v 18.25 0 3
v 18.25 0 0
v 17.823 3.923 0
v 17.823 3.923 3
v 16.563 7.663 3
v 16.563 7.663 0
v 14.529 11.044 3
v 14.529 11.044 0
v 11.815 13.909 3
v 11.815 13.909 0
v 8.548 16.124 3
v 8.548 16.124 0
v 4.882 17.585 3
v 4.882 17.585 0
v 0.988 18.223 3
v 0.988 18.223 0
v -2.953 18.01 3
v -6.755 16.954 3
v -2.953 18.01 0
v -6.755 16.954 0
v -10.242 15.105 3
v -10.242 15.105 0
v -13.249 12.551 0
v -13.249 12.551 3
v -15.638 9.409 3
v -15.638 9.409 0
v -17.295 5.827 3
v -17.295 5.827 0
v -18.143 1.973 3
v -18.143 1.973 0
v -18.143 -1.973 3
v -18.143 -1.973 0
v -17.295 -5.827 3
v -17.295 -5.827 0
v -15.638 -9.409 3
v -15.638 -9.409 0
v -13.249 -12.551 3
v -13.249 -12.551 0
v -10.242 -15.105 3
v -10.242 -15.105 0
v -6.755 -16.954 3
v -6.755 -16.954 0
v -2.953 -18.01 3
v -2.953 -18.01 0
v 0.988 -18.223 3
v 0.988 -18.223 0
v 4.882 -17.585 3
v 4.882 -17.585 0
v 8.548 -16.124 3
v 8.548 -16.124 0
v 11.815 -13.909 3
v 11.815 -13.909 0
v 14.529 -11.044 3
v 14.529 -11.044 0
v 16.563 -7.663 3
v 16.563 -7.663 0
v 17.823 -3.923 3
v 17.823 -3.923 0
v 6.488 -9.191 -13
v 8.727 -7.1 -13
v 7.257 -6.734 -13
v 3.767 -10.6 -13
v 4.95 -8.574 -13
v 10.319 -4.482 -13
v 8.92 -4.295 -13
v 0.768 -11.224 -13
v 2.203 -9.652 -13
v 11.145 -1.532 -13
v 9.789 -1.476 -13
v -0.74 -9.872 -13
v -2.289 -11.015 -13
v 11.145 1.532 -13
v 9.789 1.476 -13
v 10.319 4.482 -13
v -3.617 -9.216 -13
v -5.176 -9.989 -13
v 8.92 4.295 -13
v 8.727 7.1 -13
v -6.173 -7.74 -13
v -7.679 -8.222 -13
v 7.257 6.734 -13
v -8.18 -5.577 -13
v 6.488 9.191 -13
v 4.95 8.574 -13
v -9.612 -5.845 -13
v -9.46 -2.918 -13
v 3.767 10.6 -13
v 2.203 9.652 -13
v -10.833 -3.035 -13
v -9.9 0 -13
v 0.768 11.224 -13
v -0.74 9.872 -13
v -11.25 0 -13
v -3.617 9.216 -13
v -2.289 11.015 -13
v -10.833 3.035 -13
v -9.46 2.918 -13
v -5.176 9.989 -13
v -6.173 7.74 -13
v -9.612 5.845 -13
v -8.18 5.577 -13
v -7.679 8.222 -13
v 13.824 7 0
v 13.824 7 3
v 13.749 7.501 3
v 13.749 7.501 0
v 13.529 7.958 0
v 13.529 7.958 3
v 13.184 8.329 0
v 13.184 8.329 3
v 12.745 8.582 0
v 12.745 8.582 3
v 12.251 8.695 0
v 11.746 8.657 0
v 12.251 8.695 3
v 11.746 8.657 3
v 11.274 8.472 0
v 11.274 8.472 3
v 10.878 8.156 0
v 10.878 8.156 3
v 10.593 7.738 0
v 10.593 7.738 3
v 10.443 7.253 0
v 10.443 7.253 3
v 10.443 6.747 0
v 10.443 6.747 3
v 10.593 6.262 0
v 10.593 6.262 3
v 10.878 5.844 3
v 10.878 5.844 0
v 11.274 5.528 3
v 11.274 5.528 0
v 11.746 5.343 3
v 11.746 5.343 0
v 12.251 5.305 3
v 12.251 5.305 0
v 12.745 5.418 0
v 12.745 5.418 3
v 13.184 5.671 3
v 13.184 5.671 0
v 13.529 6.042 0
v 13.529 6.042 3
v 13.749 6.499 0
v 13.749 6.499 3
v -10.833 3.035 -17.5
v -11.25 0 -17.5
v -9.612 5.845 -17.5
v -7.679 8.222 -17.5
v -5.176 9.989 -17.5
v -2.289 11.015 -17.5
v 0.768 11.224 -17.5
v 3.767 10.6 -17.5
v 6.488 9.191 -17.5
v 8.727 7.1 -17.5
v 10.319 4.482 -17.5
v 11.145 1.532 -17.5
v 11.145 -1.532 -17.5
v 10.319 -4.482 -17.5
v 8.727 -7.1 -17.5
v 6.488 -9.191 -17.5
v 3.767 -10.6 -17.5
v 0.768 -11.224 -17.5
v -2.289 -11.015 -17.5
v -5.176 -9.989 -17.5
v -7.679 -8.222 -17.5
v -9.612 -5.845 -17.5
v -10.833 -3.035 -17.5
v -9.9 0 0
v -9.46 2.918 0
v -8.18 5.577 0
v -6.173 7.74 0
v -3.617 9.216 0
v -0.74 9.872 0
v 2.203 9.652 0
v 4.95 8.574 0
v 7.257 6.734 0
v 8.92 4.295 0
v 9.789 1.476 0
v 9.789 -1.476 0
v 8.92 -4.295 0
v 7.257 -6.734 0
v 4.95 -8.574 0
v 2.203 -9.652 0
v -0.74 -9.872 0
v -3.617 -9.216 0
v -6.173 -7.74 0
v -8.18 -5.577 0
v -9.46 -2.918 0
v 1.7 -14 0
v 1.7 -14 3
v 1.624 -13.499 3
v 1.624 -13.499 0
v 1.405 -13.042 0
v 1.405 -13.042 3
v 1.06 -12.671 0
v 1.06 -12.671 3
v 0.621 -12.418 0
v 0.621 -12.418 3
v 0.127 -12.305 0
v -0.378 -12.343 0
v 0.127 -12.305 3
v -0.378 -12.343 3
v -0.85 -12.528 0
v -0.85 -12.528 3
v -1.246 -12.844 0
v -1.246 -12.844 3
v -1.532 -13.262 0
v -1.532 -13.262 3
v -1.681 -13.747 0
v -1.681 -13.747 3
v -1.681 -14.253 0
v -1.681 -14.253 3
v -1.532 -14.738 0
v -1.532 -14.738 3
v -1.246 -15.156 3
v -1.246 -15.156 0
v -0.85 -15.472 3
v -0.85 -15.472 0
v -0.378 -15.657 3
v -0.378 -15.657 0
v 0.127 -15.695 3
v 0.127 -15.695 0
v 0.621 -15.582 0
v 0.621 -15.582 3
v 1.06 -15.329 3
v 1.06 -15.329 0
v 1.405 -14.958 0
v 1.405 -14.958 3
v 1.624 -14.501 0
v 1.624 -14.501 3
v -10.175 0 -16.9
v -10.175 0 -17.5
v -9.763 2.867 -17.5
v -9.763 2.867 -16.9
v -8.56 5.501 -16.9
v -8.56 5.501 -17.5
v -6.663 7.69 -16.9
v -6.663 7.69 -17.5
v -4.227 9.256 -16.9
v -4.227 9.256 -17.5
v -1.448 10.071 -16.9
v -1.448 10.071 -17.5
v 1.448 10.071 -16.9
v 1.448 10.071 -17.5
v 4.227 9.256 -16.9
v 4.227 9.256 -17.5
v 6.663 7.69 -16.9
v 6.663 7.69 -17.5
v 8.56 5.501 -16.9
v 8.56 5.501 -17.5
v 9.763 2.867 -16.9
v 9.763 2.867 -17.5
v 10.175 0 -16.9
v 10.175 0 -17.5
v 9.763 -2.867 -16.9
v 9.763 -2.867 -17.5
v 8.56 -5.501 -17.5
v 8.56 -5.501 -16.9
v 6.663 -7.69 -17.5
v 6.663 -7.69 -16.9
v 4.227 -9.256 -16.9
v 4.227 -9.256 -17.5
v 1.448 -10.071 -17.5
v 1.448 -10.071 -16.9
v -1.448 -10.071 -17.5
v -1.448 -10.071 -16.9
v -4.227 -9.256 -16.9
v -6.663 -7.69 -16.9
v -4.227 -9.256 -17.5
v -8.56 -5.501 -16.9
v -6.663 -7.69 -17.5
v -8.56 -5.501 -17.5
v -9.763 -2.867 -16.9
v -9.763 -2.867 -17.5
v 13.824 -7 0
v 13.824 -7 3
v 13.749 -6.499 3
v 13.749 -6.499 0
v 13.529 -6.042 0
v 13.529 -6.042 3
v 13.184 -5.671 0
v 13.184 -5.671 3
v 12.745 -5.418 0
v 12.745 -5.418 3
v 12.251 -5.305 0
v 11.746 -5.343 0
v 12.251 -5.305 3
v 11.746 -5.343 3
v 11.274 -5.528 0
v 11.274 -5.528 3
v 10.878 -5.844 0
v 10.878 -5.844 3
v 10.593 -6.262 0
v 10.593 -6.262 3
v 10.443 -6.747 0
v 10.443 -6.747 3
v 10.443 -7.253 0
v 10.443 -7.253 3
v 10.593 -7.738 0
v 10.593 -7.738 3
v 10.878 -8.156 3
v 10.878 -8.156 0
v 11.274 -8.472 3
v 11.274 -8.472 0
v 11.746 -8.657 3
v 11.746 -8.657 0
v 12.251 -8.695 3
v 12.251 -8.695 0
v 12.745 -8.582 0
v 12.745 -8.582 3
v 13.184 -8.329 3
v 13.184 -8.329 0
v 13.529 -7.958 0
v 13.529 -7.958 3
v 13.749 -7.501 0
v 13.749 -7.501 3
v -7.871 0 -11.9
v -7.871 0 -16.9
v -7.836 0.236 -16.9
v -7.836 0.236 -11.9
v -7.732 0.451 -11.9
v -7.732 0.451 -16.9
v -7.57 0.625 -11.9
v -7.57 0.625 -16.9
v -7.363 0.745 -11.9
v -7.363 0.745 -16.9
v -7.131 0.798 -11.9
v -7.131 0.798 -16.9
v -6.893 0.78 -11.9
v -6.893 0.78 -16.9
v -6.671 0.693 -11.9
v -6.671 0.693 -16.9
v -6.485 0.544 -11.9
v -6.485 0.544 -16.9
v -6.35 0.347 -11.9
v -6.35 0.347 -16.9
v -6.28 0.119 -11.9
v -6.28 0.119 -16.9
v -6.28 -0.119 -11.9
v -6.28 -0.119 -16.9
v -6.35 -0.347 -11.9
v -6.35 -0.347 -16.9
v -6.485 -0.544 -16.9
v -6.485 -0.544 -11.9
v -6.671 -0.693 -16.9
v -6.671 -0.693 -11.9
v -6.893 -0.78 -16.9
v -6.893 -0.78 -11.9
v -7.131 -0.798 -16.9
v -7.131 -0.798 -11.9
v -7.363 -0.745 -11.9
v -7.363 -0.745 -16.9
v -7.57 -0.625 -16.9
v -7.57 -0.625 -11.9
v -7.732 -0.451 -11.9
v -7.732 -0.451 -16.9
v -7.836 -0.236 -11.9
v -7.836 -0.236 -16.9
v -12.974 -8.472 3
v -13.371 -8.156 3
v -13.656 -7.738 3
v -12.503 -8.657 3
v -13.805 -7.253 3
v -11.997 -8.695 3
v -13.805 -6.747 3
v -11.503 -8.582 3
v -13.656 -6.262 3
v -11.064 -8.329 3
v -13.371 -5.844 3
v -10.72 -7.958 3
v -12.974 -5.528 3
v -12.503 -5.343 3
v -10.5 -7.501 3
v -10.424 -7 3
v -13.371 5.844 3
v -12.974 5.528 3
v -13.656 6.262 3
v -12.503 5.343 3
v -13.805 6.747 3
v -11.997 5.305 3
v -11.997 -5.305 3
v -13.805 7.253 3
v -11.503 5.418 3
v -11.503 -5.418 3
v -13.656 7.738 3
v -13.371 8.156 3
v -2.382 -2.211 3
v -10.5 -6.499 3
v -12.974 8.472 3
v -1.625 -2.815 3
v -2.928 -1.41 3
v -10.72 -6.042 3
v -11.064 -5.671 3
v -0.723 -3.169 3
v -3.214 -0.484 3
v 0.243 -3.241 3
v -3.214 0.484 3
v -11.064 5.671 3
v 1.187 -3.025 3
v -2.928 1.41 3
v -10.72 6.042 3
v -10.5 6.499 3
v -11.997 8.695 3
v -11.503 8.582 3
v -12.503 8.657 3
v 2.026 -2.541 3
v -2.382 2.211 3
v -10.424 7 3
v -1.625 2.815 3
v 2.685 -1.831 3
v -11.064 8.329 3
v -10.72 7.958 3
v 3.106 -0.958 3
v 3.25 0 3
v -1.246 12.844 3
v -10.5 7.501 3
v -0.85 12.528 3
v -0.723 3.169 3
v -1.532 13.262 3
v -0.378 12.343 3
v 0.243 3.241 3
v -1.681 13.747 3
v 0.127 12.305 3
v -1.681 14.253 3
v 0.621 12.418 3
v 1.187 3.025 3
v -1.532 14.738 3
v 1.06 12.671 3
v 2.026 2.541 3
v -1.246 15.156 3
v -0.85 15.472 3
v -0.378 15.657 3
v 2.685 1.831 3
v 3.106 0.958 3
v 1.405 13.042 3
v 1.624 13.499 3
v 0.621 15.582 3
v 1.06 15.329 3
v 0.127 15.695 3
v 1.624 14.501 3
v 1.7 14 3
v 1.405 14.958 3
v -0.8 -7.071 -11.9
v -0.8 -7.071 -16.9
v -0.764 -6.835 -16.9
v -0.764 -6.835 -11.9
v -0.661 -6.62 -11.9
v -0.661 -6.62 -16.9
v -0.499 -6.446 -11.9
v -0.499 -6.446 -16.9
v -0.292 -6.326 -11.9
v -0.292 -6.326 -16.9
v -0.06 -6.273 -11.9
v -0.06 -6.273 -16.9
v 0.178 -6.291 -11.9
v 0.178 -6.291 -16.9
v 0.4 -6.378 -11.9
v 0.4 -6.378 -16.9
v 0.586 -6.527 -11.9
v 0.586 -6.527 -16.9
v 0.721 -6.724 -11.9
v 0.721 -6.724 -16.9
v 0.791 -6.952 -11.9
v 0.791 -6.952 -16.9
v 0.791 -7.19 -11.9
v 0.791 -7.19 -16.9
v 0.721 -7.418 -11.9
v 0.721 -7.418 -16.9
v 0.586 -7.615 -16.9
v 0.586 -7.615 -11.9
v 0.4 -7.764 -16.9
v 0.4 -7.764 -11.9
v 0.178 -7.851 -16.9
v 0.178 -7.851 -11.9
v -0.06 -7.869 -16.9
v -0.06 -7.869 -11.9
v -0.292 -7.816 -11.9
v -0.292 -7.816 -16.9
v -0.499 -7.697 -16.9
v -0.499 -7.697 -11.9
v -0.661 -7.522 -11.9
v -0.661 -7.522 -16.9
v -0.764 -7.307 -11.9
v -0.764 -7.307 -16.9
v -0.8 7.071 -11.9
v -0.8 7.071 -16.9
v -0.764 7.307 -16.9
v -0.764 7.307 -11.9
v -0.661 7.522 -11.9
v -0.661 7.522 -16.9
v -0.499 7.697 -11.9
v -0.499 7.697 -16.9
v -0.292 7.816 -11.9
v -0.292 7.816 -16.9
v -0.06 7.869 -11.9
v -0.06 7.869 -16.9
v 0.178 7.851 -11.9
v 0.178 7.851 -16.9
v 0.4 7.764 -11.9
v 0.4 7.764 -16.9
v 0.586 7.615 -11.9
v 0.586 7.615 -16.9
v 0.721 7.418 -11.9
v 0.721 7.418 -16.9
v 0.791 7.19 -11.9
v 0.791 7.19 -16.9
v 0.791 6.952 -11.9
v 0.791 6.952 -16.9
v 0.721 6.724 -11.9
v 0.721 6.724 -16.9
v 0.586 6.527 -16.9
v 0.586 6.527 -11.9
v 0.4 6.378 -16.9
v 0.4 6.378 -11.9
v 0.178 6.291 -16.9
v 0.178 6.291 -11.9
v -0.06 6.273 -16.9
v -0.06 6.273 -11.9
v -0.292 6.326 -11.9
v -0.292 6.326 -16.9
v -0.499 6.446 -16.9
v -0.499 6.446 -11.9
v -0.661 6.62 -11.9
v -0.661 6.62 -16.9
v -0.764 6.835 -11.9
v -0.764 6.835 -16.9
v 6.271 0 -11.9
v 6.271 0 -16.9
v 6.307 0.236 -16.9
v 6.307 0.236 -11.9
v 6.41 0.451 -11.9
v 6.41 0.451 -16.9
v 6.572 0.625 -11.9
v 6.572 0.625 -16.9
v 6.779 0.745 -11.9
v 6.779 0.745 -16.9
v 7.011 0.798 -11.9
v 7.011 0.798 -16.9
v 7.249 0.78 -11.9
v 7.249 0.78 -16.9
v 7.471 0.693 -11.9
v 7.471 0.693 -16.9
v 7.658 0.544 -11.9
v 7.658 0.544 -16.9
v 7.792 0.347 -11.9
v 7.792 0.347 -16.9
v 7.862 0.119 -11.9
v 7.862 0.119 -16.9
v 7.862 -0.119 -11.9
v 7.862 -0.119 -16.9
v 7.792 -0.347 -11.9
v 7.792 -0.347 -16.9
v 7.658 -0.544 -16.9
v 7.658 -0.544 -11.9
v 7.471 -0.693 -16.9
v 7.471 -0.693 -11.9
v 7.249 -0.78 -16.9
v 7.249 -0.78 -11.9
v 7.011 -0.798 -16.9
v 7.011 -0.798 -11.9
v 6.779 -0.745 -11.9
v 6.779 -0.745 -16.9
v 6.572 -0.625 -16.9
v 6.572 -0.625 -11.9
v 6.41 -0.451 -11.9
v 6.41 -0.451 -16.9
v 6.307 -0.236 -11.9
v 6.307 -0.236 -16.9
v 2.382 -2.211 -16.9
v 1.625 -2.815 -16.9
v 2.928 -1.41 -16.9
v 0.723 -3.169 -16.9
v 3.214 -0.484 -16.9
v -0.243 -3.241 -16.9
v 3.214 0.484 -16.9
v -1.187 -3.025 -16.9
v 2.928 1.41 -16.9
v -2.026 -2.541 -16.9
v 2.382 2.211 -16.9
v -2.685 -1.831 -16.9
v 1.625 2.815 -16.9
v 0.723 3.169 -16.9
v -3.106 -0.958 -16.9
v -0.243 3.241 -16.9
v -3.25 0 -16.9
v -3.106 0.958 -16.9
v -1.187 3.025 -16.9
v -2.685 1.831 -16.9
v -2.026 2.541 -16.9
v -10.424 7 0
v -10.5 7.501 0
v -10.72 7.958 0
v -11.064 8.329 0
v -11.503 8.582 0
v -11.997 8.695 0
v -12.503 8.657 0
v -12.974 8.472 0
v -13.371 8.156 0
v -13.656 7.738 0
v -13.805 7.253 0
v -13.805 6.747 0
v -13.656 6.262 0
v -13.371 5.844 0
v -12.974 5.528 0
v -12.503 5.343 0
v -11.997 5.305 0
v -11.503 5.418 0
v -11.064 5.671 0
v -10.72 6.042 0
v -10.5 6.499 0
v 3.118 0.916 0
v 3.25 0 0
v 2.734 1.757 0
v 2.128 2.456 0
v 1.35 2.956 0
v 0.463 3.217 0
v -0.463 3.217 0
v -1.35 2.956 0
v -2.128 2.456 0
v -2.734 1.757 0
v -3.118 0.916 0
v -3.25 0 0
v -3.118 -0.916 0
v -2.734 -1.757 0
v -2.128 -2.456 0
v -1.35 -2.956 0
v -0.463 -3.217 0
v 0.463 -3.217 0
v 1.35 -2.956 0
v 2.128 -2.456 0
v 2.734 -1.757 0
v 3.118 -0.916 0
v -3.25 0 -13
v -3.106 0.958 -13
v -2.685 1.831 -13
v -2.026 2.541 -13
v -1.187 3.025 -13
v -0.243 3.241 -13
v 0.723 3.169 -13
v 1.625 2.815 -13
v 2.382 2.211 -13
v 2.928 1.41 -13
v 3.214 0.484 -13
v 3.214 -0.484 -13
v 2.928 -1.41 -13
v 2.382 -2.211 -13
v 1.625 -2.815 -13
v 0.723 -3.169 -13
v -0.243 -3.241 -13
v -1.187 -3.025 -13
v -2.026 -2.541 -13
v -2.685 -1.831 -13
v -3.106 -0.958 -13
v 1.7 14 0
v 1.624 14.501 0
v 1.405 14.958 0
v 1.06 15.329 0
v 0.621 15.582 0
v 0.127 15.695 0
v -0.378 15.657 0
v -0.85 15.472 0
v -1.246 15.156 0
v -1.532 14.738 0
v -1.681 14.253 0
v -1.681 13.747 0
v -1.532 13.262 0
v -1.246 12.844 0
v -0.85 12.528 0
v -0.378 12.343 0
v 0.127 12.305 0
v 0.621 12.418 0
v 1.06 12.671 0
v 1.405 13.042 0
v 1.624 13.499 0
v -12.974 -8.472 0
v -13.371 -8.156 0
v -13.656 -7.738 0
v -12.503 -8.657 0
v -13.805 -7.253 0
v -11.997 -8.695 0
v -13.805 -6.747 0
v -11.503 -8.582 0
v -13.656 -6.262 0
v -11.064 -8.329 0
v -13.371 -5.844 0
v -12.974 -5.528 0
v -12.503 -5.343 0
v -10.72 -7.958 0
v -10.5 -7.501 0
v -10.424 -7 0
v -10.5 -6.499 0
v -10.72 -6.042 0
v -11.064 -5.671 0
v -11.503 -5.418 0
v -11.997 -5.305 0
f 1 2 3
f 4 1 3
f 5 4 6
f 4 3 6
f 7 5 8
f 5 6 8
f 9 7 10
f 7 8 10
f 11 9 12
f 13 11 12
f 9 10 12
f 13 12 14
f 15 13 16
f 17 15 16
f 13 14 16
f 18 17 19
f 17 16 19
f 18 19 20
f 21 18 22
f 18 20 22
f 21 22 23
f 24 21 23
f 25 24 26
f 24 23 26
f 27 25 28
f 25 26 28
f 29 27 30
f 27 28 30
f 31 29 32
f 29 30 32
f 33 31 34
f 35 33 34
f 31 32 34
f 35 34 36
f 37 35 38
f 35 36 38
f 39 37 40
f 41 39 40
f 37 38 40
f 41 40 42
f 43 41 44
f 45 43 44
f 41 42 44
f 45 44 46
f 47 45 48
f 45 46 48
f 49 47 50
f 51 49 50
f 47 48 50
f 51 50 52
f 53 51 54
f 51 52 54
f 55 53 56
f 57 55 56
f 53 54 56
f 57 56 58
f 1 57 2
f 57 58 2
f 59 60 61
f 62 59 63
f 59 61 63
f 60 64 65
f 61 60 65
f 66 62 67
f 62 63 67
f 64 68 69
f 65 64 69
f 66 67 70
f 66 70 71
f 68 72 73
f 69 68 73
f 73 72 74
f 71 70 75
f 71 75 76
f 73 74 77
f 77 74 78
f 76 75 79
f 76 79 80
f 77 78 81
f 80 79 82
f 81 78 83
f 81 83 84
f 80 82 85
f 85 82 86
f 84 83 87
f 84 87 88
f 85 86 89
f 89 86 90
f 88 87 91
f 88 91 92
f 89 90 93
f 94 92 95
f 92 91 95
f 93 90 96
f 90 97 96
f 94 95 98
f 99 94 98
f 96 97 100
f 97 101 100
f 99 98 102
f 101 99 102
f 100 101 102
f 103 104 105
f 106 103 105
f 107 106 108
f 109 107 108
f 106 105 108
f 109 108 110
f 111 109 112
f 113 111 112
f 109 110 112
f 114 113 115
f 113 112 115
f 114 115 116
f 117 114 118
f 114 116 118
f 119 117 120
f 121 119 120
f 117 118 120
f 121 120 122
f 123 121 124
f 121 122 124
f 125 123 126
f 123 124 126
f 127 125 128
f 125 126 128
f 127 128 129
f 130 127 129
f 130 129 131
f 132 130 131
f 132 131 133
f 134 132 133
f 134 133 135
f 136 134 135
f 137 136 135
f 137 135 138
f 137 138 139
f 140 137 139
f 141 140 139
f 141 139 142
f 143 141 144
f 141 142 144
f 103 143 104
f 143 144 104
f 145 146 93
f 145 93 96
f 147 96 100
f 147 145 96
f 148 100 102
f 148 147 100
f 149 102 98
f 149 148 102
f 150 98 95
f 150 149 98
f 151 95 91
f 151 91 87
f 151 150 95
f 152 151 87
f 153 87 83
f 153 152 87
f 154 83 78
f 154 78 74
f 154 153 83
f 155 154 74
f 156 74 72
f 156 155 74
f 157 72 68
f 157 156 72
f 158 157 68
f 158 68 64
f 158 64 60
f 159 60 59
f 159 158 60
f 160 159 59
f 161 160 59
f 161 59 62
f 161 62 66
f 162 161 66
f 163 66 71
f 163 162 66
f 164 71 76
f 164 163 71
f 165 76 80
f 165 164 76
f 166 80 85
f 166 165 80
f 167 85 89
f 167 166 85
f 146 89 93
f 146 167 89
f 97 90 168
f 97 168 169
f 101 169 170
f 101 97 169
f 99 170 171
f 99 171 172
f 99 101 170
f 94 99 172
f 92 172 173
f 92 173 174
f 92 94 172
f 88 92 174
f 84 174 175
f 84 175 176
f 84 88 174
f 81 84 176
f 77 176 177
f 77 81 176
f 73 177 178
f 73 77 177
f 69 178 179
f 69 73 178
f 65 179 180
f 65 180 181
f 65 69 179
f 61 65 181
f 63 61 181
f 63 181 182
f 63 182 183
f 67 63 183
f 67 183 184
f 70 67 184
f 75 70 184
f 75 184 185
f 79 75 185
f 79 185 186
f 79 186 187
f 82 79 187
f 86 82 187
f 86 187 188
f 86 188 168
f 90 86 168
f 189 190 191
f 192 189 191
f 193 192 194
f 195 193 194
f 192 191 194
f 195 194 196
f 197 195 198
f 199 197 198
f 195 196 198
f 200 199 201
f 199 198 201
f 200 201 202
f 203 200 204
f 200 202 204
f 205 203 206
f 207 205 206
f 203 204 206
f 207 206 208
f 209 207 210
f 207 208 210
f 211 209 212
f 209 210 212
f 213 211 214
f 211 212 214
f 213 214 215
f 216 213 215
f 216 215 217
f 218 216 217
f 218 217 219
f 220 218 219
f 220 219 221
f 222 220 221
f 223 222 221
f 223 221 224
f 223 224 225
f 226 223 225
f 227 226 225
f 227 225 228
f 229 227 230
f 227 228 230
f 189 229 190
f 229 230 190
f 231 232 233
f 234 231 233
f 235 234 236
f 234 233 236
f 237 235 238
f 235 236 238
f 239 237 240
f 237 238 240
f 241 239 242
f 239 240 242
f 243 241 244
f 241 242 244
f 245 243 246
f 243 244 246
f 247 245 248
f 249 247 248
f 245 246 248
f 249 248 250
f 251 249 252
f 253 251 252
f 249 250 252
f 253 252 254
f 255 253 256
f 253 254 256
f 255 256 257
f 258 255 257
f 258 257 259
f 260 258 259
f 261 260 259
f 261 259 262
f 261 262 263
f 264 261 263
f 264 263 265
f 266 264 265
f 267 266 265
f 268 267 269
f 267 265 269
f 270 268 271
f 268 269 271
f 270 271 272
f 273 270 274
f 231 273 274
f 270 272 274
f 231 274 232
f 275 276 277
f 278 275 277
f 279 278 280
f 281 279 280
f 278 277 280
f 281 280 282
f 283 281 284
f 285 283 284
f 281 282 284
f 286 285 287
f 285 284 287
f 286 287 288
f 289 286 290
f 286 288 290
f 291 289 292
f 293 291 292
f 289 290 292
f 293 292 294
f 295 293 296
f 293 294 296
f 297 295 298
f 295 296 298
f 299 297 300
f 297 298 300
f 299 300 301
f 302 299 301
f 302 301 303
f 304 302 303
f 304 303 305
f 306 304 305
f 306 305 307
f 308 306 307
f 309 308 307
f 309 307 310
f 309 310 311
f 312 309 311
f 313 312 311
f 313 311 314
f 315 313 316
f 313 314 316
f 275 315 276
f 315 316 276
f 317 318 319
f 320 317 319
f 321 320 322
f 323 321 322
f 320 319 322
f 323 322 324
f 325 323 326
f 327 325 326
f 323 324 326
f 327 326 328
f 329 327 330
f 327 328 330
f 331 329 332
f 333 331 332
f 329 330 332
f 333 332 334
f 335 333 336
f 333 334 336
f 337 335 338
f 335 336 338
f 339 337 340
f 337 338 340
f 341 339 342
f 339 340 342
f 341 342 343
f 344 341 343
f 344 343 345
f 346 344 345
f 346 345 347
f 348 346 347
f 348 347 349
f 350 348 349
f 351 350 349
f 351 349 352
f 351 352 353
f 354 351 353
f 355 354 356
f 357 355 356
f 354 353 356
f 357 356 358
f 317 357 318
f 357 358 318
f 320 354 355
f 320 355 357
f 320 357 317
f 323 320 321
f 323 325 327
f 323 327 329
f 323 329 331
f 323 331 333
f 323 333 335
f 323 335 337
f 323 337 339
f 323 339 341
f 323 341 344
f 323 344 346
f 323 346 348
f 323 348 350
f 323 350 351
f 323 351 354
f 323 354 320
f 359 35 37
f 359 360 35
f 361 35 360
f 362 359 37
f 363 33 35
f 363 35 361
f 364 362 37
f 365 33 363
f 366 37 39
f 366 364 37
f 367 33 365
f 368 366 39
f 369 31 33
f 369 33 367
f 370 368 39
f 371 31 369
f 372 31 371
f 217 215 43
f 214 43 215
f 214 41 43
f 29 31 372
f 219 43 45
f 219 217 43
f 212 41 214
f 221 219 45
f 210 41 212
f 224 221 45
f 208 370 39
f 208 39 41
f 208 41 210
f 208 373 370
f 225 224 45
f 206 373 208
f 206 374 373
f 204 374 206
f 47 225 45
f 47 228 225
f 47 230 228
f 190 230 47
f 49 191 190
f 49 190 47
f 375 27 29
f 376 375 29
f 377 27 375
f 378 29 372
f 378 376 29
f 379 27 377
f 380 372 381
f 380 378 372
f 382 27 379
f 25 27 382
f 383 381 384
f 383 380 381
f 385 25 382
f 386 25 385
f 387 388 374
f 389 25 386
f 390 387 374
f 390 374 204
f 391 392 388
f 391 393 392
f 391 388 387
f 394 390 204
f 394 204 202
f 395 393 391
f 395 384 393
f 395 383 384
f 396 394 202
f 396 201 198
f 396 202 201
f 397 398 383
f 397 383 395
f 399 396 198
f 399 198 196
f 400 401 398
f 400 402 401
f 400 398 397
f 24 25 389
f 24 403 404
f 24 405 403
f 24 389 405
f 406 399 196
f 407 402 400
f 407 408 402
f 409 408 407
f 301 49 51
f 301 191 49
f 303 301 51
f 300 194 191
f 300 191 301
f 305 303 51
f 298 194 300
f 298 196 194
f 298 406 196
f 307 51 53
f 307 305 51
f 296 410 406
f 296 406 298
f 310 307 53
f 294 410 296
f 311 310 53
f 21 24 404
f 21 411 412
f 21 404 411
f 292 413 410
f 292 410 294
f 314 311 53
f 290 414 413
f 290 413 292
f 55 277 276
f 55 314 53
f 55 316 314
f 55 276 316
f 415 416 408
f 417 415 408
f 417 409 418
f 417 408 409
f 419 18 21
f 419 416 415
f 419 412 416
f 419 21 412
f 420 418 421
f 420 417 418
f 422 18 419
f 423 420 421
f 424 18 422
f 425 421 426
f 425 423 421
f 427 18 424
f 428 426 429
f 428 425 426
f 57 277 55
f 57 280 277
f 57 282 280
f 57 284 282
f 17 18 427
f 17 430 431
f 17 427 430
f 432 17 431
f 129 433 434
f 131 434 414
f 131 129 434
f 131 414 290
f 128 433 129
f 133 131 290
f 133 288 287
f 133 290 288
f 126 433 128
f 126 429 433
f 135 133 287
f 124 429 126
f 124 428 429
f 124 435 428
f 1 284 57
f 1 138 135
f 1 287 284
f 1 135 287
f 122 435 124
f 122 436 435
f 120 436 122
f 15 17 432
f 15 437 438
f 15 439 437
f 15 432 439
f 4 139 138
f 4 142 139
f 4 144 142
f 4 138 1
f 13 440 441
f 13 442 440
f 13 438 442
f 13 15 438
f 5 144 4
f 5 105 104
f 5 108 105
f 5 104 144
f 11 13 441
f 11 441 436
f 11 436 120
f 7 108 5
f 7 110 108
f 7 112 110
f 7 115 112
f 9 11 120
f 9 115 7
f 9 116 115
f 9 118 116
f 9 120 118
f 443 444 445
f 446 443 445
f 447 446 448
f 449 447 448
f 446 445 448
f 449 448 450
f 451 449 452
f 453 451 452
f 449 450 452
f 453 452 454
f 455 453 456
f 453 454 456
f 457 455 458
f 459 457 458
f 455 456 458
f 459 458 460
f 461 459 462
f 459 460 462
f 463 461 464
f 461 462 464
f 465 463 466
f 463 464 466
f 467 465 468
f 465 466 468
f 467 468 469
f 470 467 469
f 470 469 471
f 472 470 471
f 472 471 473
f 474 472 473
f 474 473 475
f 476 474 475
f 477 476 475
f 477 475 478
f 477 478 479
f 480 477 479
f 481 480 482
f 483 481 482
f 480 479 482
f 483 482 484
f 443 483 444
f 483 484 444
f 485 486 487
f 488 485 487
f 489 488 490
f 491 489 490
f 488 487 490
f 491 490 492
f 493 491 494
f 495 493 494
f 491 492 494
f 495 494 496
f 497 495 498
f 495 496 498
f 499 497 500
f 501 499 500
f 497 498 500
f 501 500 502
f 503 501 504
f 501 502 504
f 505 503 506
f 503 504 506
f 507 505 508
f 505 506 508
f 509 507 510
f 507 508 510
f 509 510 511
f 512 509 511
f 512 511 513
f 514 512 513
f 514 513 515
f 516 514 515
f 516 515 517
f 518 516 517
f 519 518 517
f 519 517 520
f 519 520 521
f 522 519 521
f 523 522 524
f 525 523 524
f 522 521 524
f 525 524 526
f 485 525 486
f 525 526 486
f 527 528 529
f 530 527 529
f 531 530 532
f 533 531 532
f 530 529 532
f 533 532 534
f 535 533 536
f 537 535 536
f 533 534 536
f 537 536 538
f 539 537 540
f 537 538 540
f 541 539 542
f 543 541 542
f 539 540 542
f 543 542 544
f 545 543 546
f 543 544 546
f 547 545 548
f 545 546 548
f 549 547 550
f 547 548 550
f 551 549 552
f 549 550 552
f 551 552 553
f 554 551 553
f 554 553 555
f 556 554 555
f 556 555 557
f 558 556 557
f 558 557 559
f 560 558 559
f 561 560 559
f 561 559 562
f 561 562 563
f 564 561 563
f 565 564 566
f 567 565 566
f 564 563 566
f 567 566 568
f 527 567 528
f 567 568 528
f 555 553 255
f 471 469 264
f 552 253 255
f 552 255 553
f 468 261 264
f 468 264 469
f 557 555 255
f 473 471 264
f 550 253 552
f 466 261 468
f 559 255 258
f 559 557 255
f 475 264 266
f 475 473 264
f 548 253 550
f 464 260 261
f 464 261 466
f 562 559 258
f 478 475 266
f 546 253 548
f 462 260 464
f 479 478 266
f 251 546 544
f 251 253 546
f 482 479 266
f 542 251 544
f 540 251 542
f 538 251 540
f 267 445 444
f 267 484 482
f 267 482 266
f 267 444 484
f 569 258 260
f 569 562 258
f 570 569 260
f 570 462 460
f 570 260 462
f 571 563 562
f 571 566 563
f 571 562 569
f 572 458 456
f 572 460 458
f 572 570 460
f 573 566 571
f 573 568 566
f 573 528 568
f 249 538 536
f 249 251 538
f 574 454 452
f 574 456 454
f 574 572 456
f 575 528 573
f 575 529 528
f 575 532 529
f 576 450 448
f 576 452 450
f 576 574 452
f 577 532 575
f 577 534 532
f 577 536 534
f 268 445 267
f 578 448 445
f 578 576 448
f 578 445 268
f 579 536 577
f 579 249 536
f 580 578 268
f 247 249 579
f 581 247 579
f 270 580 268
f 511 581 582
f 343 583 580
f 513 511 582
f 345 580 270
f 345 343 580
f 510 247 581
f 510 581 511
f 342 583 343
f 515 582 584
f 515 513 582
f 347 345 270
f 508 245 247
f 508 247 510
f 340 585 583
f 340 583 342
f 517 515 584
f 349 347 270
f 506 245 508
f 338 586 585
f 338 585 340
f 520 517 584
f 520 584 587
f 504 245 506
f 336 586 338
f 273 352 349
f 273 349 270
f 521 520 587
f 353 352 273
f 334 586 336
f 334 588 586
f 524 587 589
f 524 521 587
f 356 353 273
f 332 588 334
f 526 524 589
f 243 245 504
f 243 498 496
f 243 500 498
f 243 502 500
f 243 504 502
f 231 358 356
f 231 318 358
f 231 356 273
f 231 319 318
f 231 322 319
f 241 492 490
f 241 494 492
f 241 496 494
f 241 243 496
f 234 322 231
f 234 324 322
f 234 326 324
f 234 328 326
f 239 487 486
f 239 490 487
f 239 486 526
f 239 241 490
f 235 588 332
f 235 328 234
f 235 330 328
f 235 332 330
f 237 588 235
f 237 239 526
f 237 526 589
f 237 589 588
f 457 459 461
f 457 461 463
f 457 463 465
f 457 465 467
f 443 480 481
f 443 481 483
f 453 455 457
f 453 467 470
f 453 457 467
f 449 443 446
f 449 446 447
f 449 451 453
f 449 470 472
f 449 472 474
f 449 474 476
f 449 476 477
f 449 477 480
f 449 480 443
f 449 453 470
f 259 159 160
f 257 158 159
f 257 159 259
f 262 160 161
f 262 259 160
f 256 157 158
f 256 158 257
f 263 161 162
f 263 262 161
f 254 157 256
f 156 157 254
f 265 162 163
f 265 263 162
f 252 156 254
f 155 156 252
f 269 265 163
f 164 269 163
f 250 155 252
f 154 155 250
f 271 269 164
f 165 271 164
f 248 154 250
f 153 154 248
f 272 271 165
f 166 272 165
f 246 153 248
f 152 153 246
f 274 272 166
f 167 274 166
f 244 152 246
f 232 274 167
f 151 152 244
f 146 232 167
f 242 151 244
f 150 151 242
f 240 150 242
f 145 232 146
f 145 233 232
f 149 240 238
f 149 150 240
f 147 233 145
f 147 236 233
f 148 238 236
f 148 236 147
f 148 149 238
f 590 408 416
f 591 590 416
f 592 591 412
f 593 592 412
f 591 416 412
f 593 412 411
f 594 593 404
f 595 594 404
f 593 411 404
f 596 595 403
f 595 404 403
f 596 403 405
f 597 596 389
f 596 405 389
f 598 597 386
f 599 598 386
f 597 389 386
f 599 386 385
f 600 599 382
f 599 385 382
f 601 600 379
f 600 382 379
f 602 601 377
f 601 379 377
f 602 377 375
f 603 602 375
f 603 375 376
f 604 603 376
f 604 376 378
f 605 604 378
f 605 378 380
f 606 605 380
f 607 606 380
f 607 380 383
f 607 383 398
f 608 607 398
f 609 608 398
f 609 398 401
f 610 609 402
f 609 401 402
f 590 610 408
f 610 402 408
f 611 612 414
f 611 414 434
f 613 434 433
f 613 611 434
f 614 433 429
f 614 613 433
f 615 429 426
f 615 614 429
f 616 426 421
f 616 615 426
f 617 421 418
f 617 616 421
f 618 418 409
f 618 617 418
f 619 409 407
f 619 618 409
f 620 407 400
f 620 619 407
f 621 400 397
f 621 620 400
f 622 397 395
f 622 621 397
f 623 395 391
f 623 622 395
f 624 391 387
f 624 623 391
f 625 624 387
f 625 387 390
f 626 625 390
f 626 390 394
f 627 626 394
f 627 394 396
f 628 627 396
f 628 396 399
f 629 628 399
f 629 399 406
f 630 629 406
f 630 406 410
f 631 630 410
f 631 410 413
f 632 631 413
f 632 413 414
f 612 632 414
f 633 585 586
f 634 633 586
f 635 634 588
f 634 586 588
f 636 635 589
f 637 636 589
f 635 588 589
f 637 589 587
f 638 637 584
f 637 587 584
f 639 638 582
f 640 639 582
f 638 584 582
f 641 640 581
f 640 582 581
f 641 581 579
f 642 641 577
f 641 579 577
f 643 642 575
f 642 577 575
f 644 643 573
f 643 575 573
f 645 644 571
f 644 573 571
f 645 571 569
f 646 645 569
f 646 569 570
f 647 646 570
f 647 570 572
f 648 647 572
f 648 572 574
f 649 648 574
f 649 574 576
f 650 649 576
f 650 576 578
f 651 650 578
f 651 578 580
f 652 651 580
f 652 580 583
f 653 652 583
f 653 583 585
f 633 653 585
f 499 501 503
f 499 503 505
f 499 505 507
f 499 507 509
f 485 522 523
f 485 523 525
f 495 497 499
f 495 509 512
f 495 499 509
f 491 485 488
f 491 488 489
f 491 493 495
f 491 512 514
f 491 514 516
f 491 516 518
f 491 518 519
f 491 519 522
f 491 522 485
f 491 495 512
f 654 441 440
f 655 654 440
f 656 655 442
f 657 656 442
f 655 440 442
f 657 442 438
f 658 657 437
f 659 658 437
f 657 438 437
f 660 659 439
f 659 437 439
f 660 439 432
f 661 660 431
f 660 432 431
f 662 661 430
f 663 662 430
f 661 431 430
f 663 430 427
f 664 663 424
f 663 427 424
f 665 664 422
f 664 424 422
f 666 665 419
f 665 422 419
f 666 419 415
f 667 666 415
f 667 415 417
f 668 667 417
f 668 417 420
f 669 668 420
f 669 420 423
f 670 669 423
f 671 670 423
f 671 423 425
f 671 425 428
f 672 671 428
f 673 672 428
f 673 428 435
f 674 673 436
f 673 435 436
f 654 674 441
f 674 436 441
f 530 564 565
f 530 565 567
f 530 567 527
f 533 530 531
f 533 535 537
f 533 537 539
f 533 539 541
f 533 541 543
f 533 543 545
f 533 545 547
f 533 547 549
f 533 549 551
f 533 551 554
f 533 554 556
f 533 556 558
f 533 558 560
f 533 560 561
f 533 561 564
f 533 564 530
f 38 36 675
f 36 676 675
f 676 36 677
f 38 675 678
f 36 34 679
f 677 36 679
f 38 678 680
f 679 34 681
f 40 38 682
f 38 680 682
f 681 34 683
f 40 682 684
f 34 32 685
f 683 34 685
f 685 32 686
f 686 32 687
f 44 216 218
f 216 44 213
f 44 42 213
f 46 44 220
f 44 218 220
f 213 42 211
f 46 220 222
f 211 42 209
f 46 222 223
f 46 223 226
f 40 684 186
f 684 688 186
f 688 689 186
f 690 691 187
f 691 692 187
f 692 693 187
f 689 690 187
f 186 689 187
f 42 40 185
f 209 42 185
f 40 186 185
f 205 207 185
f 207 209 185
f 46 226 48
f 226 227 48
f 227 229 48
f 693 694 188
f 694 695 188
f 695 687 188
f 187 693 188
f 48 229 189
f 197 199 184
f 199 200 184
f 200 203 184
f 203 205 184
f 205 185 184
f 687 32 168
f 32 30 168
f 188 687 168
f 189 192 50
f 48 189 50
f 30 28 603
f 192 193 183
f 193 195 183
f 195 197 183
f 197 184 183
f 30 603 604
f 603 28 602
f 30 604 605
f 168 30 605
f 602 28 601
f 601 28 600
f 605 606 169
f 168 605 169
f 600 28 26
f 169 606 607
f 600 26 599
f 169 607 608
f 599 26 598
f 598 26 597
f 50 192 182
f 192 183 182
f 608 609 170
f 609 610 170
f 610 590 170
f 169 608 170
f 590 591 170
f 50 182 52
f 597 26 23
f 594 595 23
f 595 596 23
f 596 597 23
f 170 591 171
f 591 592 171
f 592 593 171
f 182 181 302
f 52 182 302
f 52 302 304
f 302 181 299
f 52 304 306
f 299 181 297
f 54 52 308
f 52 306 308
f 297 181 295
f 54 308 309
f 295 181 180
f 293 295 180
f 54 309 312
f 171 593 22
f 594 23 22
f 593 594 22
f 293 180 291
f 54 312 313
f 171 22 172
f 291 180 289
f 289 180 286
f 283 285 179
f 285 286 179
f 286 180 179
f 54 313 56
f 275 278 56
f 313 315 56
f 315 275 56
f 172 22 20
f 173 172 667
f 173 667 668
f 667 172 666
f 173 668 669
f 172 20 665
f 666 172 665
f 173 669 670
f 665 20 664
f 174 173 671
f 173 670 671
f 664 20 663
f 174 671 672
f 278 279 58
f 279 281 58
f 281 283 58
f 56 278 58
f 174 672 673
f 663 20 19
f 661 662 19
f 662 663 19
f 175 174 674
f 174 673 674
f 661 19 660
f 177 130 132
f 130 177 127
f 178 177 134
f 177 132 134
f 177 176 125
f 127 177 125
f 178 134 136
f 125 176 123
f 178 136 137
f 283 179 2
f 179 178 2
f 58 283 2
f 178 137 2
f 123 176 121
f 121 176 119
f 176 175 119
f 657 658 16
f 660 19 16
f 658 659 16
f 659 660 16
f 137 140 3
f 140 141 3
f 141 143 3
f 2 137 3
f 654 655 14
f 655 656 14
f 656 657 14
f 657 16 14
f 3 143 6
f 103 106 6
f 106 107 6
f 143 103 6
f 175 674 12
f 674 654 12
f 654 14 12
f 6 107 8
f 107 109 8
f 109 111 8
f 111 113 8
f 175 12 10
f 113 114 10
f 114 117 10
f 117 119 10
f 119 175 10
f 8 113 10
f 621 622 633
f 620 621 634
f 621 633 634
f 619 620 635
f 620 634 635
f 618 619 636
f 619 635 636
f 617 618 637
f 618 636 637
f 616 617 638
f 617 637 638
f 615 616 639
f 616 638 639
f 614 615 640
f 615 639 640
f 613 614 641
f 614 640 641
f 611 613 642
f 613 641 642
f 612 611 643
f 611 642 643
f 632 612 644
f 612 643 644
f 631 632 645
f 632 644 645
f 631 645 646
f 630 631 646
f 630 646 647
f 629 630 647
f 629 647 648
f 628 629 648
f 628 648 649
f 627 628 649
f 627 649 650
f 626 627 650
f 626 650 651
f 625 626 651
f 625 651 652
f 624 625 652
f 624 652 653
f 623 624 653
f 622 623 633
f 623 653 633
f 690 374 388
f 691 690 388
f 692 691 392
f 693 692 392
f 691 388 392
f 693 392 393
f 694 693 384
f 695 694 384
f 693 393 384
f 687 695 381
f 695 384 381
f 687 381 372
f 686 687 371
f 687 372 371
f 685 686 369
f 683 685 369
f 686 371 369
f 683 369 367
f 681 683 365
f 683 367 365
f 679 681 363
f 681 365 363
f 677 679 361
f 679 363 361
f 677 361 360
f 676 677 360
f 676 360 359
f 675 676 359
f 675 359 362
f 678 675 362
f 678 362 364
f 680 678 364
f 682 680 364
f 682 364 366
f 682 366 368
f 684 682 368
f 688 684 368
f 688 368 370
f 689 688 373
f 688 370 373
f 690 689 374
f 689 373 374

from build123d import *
from build123d.topology import SkipClean

# Parameters (mm, degrees)
SKETCH_36_5_3_R             = 18.25
SKETCH_36_5_3_R_2           = 3.25
EXTRUDE_36_5_3_DEPTH        = 3
EXTRUDE_START               = 17.5
SKETCH_19_8_17_5_R          = 9.9
SKETCH_19_8_17_5_R_2        = 3.25
EXTRUDE_19_8_17_5_DEPTH     = 17.5
SKETCH_22_5_4_5_R           = 11.25
SKETCH_22_5_4_5_R_2         = 3.25
EXTRUDE_22_5_4_5_DEPTH      = 4.5
SKETCH_3_4_28_R             = 1.7
CUT_EXTRUDE_3_4_28_DEPTH    = 3
SKETCH_20_35_0_6_R          = 10.175
CUT_EXTRUDE_20_35_0_6_DEPTH = 0.6
M2X0_4_14_142_2_R           = 0.8
M2X0_4_14_142_DEPTH         = 5


with BuildPart() as part:
    # 轴承端法兰_Ø36.5_厚3_草图 → 轴承端法兰_Ø36.5_厚3 (new body)
    with BuildSketch(Plane.XY):
        Circle(SKETCH_36_5_3_R)
        Circle(SKETCH_36_5_3_R_2, mode=Mode.SUBTRACT)
    extrude(amount=EXTRUDE_36_5_3_DEPTH)

    # 穿轴颈_Ø19.8_长17.5_草图 → 穿轴颈_Ø19.8_长17.5 (add)
    with SkipClean():  # the faces are left unmerged after this step: merging them gives an invalid solid
        with BuildSketch(Plane(origin=(0, 0, 0), x_dir=(-1, 0, 0), z_dir=(0, 0, -1)).offset(EXTRUDE_START)):
            Circle(SKETCH_19_8_17_5_R)
            Circle(SKETCH_19_8_17_5_R_2, mode=Mode.SUBTRACT)
        extrude(amount=-EXTRUDE_19_8_17_5_DEPTH)

    # 舵盘端凸缘_Ø22.5_长4.5_草图 → 舵盘端凸缘_Ø22.5_长4.5 (add)
    with SkipClean():  # the faces are left unmerged after this step: merging them gives an invalid solid
        with BuildSketch(Plane(origin=(0, 0, -17.5), x_dir=(-1, 0, 0), z_dir=(0, 0, -1))):
            Circle(SKETCH_22_5_4_5_R)
            Circle(SKETCH_22_5_4_5_R_2, mode=Mode.SUBTRACT)
        extrude(amount=-EXTRUDE_22_5_4_5_DEPTH)

    # 轴承端_六处Ø3.4_分度圆Ø28_草图 → 轴承端_六处Ø3.4_分度圆Ø28 (cut)
    with SkipClean():  # the faces are left unmerged after this step: merging them gives an invalid solid
        with BuildSketch(Plane.XY.offset(3)):
            with Locations((12.124355653, 7)):
                Circle(SKETCH_3_4_28_R)
            with Locations((0, 14)):
                Circle(SKETCH_3_4_28_R)
            with Locations((-12.124355653, 7)):
                Circle(SKETCH_3_4_28_R)
            with Locations((-12.124355653, -7)):
                Circle(SKETCH_3_4_28_R)
            with Locations((0, -14)):
                Circle(SKETCH_3_4_28_R)
            with Locations((12.124355653, -7)):
                Circle(SKETCH_3_4_28_R)
        extrude(amount=-CUT_EXTRUDE_3_4_28_DEPTH, mode=Mode.SUBTRACT)

    # 舵盘止口_Ø20.35_深0.6_草图 → 舵盘止口_Ø20.35_深0.6 (cut)
    with SkipClean():  # the faces are left unmerged after this step: merging them gives an invalid solid
        with BuildSketch(Plane(origin=(0, 0, -17.5), x_dir=(-1, 0, 0), z_dir=(0, 0, -1))):
            Circle(SKETCH_20_35_0_6_R)
        extrude(amount=-CUT_EXTRUDE_20_35_0_6_DEPTH, mode=Mode.SUBTRACT)

    # M2x0.4__14.142 2 → M2x0.4__14.142 (cut)
    with SkipClean():  # the faces are left unmerged after this step: merging them gives an invalid solid
        with BuildSketch(Plane(origin=(0, 0, -16.9), x_dir=(-1, 0, 0), z_dir=(0, 0, -1))):
            with Locations((-7.071067812, 0)):
                Circle(M2X0_4_14_142_2_R)
            with Locations((0, 7.071067812)):
                Circle(M2X0_4_14_142_2_R)
            with Locations((7.071067812, 0)):
                Circle(M2X0_4_14_142_2_R)
            with Locations((0, -7.071067812)):
                Circle(M2X0_4_14_142_2_R)
        extrude(amount=-M2X0_4_14_142_DEPTH, mode=Mode.SUBTRACT)


solid = part.part
